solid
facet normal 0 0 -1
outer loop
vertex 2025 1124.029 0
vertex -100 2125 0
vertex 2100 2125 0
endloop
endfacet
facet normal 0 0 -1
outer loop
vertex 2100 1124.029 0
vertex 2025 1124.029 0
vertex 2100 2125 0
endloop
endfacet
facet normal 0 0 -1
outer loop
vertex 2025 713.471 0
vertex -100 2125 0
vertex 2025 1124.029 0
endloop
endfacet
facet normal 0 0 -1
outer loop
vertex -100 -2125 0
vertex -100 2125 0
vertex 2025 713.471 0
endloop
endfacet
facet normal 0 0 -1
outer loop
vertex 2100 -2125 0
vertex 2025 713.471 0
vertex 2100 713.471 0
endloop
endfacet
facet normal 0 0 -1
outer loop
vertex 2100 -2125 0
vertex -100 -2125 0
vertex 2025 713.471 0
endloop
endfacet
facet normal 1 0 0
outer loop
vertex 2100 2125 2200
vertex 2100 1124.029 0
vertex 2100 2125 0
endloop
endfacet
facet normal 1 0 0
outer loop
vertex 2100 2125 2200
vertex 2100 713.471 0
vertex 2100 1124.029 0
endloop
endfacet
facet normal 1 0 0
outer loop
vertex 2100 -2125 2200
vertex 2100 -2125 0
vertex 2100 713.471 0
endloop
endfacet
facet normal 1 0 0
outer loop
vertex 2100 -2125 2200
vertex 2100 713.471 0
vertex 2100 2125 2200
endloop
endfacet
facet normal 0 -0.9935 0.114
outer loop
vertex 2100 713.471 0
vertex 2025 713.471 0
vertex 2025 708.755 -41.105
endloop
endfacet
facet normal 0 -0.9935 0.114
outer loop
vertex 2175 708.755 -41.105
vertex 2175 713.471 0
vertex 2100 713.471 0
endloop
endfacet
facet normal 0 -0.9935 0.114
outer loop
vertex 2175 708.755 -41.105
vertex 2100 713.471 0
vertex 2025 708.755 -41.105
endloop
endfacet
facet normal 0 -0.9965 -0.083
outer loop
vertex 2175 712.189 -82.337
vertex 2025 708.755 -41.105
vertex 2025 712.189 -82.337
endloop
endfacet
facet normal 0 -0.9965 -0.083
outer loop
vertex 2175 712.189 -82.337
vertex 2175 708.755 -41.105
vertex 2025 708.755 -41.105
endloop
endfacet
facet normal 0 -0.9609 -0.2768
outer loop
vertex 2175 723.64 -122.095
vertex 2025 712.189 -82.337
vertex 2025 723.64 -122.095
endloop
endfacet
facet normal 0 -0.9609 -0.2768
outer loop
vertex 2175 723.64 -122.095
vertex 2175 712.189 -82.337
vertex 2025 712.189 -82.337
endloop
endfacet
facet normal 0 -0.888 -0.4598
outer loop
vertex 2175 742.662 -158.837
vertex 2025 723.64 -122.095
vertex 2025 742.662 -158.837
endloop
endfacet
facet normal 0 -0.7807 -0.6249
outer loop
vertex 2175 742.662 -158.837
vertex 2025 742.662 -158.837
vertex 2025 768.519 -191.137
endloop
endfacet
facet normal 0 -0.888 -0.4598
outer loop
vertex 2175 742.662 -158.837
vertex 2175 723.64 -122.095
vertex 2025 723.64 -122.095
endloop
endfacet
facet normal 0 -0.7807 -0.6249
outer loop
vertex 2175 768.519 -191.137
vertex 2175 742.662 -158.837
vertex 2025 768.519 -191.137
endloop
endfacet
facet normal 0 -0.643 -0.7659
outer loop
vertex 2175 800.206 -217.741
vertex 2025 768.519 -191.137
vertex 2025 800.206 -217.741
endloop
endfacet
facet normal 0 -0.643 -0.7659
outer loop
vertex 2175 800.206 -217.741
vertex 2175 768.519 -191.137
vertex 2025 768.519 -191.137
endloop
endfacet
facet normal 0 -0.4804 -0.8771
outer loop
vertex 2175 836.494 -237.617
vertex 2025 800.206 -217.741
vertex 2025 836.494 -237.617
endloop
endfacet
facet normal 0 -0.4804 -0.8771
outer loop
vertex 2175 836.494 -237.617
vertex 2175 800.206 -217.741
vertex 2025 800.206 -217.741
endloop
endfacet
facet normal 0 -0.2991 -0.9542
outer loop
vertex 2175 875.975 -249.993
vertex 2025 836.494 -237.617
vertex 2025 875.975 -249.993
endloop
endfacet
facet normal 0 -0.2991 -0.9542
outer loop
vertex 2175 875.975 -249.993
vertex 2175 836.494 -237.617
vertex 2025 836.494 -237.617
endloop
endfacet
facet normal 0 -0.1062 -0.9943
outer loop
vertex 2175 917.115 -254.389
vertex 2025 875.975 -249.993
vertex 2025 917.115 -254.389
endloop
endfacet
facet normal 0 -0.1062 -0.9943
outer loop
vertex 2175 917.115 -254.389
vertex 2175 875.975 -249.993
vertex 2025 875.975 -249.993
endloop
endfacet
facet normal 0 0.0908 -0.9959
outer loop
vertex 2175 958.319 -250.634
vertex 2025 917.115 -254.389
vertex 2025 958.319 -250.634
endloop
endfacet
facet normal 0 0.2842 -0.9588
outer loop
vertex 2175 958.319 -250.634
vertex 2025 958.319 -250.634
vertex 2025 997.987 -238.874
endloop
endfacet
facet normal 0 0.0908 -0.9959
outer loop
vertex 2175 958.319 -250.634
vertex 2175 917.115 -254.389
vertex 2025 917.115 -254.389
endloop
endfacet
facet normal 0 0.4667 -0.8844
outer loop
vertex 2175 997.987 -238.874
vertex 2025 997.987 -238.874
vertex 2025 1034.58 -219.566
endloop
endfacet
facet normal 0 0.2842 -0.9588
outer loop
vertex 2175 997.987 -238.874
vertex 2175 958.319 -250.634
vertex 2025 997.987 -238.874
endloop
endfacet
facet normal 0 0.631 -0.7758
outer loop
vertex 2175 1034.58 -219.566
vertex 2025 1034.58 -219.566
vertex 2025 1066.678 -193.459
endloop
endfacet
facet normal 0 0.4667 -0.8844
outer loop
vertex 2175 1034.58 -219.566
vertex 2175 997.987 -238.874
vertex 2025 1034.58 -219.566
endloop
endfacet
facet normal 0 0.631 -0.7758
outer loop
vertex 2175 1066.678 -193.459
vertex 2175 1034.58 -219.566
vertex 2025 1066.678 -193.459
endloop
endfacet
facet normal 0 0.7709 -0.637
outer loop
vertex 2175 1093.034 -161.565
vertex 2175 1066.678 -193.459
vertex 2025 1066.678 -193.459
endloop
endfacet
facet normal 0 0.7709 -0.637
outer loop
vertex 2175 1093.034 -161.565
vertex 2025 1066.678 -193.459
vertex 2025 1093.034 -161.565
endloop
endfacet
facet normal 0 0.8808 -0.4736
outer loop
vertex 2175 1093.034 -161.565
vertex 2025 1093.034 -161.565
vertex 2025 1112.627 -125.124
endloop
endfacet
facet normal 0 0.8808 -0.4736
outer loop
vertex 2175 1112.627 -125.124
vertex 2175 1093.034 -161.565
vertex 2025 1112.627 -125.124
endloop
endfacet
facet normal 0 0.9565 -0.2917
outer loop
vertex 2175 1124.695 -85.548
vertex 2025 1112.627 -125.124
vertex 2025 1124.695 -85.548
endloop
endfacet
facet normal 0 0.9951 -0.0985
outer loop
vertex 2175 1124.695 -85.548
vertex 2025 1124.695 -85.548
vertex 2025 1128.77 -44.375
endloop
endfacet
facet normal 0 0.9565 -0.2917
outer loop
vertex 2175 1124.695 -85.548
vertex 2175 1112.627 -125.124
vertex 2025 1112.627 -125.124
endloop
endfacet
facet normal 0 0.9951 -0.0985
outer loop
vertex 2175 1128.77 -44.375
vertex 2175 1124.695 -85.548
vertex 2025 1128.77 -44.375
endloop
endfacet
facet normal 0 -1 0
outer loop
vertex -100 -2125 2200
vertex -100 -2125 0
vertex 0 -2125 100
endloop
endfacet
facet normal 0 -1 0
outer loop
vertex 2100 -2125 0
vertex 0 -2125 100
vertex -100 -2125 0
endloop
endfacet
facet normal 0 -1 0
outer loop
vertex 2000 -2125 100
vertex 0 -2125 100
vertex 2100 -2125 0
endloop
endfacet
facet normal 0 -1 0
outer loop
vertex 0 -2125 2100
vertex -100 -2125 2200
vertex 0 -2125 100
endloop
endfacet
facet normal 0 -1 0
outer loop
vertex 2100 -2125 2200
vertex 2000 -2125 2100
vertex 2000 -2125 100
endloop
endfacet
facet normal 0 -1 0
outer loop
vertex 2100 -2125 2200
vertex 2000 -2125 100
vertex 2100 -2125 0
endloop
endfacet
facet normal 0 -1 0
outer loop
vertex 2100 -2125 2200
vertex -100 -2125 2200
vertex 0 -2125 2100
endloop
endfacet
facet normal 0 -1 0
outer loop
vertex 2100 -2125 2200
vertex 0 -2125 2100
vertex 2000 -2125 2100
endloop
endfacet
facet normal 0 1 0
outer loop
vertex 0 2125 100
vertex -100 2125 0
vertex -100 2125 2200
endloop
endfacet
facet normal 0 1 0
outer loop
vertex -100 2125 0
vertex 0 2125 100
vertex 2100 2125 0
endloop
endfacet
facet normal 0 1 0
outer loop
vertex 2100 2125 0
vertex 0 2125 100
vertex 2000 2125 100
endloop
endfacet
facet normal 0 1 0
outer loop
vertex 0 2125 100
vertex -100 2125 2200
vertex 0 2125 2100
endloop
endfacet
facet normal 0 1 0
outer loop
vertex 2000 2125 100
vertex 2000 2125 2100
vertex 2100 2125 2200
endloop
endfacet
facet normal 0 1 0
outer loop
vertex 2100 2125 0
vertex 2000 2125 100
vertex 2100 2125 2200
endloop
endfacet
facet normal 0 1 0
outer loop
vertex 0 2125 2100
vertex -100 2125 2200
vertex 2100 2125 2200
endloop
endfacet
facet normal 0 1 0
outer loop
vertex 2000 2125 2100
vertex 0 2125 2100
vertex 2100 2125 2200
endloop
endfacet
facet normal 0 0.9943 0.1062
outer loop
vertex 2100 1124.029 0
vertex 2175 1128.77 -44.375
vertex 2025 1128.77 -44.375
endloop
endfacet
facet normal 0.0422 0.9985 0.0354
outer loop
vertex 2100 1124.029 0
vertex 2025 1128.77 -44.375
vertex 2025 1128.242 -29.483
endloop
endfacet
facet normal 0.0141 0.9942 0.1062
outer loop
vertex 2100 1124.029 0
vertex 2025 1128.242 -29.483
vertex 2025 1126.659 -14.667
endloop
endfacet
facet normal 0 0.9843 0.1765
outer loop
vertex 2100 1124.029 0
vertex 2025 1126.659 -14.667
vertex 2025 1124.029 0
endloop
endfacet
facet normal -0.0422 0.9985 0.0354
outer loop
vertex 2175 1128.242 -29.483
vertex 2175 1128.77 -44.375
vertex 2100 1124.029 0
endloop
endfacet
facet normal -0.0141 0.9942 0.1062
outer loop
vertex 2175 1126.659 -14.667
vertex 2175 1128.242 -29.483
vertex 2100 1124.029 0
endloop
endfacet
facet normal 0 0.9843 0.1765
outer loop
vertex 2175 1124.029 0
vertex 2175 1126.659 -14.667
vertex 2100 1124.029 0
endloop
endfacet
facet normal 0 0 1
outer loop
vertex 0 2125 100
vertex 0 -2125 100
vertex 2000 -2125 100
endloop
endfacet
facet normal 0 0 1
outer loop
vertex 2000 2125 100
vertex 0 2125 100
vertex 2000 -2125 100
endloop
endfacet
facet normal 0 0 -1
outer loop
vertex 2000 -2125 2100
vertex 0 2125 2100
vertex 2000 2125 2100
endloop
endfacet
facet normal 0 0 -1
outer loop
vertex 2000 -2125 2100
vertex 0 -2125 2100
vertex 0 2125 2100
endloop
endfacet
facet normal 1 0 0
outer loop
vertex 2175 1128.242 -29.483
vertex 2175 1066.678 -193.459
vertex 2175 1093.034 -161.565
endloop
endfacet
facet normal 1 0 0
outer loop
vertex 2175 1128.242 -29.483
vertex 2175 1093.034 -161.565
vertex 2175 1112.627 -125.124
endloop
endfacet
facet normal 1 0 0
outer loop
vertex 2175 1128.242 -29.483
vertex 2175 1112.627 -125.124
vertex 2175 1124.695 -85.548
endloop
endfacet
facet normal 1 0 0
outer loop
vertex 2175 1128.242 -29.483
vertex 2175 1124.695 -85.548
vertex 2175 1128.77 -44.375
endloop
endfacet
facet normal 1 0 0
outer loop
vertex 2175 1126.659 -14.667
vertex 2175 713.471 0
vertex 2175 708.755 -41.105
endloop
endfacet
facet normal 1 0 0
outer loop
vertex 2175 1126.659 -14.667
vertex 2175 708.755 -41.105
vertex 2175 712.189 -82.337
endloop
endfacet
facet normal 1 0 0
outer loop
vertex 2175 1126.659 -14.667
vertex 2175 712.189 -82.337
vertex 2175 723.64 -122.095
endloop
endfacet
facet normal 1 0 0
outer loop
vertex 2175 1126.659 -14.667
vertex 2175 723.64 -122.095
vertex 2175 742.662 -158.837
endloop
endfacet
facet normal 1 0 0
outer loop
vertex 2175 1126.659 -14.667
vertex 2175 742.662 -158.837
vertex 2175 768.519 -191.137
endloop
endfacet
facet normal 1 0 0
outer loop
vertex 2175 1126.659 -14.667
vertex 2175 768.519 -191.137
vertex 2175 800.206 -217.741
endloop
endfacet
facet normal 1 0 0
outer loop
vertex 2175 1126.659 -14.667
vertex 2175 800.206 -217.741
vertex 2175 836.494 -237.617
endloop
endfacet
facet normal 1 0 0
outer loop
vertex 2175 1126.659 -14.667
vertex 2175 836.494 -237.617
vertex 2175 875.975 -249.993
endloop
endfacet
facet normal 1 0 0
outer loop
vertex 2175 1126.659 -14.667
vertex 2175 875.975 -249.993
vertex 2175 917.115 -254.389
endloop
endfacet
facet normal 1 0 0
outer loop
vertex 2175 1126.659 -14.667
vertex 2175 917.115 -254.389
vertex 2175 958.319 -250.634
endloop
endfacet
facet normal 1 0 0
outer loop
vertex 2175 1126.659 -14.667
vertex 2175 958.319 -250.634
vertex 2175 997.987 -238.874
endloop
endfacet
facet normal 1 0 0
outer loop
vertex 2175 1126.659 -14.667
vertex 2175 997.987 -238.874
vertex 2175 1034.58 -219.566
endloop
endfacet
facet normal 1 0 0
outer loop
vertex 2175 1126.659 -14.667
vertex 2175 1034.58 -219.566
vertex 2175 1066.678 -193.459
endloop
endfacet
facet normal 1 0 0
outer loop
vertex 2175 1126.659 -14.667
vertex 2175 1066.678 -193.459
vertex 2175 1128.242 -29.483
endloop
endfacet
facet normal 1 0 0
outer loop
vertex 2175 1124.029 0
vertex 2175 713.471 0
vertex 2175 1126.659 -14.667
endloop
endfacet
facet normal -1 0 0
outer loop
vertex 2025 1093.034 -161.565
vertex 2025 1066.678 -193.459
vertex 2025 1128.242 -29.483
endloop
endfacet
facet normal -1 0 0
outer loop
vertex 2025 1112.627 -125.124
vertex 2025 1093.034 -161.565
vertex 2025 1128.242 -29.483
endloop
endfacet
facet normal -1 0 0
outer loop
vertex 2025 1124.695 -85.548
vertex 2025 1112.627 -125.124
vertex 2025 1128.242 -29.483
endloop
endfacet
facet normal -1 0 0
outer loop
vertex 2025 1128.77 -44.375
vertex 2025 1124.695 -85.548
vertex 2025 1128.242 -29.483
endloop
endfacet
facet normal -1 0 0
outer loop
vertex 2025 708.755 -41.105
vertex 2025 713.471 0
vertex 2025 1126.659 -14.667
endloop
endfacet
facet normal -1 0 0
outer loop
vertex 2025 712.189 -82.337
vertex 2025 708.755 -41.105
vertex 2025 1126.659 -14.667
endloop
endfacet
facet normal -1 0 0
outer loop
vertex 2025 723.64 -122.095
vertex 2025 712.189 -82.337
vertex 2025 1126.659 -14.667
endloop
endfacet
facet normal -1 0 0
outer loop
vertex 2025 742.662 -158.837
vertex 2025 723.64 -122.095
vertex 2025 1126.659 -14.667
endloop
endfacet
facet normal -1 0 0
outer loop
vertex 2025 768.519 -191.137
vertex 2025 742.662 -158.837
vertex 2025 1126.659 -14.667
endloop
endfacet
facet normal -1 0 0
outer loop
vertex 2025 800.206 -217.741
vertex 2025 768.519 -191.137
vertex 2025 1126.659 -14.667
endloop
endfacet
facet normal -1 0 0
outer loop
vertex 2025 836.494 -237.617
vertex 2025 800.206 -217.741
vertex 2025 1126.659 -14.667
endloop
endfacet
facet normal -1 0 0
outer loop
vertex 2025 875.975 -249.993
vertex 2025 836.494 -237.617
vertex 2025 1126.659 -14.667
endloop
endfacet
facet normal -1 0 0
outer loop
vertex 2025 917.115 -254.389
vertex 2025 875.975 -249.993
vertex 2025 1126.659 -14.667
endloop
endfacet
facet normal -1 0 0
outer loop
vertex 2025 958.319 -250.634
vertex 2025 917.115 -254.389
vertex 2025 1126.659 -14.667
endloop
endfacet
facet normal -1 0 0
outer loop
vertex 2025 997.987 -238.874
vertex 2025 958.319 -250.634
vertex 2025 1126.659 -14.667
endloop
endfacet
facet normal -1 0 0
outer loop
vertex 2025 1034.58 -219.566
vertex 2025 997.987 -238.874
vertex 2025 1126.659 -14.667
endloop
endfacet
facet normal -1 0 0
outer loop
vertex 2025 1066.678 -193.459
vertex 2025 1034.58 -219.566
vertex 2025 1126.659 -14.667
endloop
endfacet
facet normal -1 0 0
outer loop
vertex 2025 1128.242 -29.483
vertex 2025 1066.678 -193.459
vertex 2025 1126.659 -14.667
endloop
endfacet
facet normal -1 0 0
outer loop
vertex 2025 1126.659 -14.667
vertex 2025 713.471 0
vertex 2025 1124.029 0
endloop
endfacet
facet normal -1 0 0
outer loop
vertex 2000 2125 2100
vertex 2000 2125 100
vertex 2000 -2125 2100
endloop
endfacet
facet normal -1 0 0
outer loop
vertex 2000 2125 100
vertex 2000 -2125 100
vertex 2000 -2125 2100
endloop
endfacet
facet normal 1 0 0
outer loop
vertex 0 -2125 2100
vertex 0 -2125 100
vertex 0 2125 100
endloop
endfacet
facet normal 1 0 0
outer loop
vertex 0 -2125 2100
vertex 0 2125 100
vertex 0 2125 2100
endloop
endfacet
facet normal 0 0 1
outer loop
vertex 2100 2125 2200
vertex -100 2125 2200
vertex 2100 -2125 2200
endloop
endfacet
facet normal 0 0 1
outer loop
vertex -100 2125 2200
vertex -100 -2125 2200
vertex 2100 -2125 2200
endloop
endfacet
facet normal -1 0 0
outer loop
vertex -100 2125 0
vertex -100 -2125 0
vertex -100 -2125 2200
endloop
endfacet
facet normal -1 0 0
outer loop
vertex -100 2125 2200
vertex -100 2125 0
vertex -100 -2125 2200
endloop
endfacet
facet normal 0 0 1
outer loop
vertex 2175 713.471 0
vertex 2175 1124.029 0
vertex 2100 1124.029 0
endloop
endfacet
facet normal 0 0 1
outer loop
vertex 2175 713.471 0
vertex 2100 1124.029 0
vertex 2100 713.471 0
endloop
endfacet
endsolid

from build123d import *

# Parameters (mm, degrees)
F0_W     = 2200
F0_H     = 2200
F0_W_2   = 2000
F0_H_2   = 2000
F1_DEPTH = 2125
F3_DEPTH = 75


with BuildPart() as f1:
    # F0 (on Front) → F1 (new body, symmetric)
    with BuildSketch(Plane.XZ):
        with Locations((1000, 1100)):
            Rectangle(F0_W, F0_H)
        with Locations((1000, 1100)):
            Rectangle(F0_W_2, F0_H_2, mode=Mode.SUBTRACT)
    extrude(amount=F1_DEPTH, both=True)

    # F2 (on face) → F3 (join, symmetric)
    with BuildSketch(Plane.YZ.offset(2100)):
        with BuildLine():
            ThreePointArc((713.471263, 0), (896.436303, -253.206423), (1128.77031, -44.374894))
            ThreePointArc((1128.77031, -44.374894), (1127.581576, -22.061149), (1124.028832, 0))
            Line((1124.028832, 0), (713.471263, 0))
        make_face()
    extrude(amount=F3_DEPTH, both=True)


solid = f1.part
